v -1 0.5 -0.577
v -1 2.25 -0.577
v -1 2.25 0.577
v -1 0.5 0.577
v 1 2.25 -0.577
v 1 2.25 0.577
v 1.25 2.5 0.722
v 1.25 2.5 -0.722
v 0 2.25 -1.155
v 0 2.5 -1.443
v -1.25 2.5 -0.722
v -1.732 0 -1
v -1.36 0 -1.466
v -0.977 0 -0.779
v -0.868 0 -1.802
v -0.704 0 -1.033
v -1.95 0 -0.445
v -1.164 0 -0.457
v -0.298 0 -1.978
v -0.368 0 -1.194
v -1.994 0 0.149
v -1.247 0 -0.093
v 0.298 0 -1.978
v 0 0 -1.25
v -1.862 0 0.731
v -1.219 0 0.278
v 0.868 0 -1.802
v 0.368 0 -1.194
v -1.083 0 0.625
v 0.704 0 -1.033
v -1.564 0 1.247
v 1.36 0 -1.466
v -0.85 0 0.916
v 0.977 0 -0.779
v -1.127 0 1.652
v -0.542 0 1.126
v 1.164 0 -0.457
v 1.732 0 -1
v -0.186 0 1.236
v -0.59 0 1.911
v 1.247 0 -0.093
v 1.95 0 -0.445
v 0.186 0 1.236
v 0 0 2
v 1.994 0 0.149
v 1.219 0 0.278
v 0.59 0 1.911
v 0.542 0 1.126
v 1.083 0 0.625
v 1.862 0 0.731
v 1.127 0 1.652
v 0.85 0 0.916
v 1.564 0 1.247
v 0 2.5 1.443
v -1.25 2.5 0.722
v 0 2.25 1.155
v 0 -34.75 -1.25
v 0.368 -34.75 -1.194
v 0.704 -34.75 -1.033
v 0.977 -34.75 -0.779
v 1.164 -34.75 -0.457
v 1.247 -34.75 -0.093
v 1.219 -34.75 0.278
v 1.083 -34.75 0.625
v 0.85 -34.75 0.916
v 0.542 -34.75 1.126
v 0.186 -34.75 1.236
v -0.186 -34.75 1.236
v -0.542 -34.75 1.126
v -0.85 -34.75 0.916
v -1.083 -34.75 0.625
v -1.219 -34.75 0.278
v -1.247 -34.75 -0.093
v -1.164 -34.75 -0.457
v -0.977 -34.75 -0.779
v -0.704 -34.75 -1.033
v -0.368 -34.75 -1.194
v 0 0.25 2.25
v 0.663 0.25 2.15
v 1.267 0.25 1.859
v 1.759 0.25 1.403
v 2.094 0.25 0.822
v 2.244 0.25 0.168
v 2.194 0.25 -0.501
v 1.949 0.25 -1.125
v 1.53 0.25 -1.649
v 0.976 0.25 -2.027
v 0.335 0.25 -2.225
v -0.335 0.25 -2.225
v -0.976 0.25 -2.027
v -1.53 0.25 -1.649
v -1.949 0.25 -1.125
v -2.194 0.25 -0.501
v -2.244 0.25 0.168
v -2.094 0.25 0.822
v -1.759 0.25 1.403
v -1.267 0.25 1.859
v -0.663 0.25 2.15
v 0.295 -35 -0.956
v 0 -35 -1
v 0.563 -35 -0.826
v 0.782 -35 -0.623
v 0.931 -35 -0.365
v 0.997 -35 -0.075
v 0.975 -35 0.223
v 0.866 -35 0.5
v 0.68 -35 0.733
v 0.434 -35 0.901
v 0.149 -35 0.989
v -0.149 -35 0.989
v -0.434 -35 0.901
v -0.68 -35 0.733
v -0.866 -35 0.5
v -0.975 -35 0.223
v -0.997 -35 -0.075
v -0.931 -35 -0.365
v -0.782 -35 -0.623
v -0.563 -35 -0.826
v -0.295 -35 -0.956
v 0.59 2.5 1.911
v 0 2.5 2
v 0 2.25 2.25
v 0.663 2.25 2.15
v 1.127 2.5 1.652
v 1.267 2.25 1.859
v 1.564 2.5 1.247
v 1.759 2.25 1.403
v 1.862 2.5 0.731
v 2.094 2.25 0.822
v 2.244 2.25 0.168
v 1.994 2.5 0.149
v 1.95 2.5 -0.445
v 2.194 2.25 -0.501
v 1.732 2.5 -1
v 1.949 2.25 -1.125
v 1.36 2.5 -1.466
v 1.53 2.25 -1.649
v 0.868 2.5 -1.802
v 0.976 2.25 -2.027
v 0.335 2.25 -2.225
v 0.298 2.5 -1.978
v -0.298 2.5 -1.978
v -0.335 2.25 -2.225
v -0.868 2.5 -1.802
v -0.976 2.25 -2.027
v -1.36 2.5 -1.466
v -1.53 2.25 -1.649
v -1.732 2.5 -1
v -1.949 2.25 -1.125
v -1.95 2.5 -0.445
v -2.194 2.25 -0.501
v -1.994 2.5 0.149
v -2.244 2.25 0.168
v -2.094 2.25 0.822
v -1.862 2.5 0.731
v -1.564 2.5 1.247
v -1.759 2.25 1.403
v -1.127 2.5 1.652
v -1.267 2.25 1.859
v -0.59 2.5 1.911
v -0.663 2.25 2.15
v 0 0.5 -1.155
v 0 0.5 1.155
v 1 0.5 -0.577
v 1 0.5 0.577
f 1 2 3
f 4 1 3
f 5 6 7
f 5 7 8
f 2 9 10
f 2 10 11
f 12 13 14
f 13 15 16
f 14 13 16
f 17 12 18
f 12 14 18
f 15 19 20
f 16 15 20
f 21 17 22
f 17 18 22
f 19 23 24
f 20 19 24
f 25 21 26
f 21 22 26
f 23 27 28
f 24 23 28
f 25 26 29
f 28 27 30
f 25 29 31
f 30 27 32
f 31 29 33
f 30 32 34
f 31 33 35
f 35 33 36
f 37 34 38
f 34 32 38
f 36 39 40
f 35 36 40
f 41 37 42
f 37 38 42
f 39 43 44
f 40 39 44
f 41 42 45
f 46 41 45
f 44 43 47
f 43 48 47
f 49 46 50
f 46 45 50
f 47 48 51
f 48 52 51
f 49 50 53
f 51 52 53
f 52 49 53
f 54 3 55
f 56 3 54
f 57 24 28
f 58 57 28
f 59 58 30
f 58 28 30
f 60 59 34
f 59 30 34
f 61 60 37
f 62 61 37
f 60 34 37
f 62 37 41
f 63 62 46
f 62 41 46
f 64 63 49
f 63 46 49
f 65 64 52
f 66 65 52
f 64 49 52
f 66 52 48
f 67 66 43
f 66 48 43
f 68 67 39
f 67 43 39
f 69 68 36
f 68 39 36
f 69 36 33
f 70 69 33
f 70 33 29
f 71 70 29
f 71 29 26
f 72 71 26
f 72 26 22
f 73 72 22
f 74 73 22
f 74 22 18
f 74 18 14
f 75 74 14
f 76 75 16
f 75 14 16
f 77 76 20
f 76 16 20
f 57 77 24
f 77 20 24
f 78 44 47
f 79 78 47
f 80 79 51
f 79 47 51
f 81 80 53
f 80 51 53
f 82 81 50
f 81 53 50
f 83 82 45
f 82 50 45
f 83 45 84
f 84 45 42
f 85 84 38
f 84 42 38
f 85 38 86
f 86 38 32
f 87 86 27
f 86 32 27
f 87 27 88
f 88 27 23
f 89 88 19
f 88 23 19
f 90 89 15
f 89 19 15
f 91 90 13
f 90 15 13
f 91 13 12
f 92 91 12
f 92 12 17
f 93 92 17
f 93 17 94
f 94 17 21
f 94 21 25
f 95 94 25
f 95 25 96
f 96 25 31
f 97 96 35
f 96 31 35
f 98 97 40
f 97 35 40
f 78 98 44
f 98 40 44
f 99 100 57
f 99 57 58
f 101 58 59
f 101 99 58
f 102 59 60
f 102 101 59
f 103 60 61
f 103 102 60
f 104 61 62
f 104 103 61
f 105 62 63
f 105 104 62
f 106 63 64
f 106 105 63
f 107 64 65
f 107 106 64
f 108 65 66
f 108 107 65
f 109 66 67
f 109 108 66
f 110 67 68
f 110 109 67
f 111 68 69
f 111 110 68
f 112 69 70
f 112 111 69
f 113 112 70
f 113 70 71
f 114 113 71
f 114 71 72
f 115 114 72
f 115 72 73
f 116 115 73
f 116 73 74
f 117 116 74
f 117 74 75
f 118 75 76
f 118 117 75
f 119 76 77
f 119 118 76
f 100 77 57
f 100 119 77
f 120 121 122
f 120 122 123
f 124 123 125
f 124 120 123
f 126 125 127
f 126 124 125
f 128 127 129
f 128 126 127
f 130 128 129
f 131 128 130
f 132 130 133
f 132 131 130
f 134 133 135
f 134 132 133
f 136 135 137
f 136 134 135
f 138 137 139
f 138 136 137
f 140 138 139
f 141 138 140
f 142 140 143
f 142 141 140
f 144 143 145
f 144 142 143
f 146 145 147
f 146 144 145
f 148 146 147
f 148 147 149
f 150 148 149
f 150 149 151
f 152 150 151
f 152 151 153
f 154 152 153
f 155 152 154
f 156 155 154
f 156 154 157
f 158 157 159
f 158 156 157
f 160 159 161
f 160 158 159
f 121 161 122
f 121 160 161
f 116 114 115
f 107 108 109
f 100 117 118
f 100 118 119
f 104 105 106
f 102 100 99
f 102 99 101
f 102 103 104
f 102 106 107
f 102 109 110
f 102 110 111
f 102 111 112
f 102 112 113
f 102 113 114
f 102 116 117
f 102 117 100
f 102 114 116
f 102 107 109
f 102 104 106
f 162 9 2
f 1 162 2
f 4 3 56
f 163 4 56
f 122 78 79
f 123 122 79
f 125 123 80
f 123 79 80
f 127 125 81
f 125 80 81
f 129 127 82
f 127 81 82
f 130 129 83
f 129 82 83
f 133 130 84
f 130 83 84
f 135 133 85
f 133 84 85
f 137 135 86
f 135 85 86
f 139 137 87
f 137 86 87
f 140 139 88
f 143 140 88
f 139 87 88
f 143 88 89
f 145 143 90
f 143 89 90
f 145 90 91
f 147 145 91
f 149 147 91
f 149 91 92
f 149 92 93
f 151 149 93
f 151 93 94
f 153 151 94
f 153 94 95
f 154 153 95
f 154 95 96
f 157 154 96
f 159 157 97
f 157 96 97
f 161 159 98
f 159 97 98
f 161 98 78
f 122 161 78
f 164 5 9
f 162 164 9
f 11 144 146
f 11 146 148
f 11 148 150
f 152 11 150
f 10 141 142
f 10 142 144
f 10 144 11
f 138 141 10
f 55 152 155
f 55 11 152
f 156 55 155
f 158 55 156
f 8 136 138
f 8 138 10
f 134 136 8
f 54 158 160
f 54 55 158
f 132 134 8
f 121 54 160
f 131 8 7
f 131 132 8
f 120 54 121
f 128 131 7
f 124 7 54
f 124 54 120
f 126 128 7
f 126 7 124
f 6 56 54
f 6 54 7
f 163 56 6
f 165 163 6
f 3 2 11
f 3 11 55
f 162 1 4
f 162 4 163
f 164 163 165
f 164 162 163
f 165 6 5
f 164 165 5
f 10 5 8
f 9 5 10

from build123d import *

# Parameters (mm, degrees)
SKETCH_1_R          = 2.25
EXTRUDE_1_DEPTH     = 2.5
CUT_EXTRUDE_1_DEPTH = 2
SKETCH_3_R          = 1.25
EXTRUDE_2_DEPTH     = 35
CHAMFER_1_SIZE      = 0.25


with BuildPart() as part:
    # 草图1 → 凸台-拉伸1 (new body)
    with BuildSketch(Plane(origin=(0, 0, 0), x_dir=(1, 0, 0), z_dir=(0, 1, 0))):
        with Locations(Location((0, 0, 0), (0, 0, 270))):
            Circle(SKETCH_1_R)
    extrude(amount=EXTRUDE_1_DEPTH)

    # 草图2 → 切除-拉伸1 (cut)
    with BuildSketch(Plane(origin=(0, 2.5, 0), x_dir=(1, 0, 0), z_dir=(0, 1, 0))):
        Polygon((0, 1.154700538), (-1, 0.577350269), (-1, -0.577350269), (0, -1.154700538), (1, -0.577350269), (1, 0.577350269), align=None)
    extrude(amount=-CUT_EXTRUDE_1_DEPTH, mode=Mode.SUBTRACT)

    # 草图3 → 凸台-拉伸2 (add)
    with BuildSketch(Plane.XZ):
        with Locations(Location((0, 0, 0), (0, 0, 270))):
            Circle(SKETCH_3_R)
    extrude(amount=EXTRUDE_2_DEPTH)

    # 倒角1
    chamfer_1_edges = [part.edges().sort_by_distance(p)[0] for p in [
        (0.5, 2.5, -0.866025404),
        (-0.5, 2.5, -0.866025404),
        (-1, 2.5, 0),
        (-0.5, 2.5, 0.866025404),
        (0.5, 2.5, 0.866025404),
        (1, 2.5, 0),
        (0, 0, -2.25),
        (0, -35, 1.25),
        (0, 2.5, -2.25),
    ]]
    chamfer(chamfer_1_edges, length=CHAMFER_1_SIZE)


solid = part.part
